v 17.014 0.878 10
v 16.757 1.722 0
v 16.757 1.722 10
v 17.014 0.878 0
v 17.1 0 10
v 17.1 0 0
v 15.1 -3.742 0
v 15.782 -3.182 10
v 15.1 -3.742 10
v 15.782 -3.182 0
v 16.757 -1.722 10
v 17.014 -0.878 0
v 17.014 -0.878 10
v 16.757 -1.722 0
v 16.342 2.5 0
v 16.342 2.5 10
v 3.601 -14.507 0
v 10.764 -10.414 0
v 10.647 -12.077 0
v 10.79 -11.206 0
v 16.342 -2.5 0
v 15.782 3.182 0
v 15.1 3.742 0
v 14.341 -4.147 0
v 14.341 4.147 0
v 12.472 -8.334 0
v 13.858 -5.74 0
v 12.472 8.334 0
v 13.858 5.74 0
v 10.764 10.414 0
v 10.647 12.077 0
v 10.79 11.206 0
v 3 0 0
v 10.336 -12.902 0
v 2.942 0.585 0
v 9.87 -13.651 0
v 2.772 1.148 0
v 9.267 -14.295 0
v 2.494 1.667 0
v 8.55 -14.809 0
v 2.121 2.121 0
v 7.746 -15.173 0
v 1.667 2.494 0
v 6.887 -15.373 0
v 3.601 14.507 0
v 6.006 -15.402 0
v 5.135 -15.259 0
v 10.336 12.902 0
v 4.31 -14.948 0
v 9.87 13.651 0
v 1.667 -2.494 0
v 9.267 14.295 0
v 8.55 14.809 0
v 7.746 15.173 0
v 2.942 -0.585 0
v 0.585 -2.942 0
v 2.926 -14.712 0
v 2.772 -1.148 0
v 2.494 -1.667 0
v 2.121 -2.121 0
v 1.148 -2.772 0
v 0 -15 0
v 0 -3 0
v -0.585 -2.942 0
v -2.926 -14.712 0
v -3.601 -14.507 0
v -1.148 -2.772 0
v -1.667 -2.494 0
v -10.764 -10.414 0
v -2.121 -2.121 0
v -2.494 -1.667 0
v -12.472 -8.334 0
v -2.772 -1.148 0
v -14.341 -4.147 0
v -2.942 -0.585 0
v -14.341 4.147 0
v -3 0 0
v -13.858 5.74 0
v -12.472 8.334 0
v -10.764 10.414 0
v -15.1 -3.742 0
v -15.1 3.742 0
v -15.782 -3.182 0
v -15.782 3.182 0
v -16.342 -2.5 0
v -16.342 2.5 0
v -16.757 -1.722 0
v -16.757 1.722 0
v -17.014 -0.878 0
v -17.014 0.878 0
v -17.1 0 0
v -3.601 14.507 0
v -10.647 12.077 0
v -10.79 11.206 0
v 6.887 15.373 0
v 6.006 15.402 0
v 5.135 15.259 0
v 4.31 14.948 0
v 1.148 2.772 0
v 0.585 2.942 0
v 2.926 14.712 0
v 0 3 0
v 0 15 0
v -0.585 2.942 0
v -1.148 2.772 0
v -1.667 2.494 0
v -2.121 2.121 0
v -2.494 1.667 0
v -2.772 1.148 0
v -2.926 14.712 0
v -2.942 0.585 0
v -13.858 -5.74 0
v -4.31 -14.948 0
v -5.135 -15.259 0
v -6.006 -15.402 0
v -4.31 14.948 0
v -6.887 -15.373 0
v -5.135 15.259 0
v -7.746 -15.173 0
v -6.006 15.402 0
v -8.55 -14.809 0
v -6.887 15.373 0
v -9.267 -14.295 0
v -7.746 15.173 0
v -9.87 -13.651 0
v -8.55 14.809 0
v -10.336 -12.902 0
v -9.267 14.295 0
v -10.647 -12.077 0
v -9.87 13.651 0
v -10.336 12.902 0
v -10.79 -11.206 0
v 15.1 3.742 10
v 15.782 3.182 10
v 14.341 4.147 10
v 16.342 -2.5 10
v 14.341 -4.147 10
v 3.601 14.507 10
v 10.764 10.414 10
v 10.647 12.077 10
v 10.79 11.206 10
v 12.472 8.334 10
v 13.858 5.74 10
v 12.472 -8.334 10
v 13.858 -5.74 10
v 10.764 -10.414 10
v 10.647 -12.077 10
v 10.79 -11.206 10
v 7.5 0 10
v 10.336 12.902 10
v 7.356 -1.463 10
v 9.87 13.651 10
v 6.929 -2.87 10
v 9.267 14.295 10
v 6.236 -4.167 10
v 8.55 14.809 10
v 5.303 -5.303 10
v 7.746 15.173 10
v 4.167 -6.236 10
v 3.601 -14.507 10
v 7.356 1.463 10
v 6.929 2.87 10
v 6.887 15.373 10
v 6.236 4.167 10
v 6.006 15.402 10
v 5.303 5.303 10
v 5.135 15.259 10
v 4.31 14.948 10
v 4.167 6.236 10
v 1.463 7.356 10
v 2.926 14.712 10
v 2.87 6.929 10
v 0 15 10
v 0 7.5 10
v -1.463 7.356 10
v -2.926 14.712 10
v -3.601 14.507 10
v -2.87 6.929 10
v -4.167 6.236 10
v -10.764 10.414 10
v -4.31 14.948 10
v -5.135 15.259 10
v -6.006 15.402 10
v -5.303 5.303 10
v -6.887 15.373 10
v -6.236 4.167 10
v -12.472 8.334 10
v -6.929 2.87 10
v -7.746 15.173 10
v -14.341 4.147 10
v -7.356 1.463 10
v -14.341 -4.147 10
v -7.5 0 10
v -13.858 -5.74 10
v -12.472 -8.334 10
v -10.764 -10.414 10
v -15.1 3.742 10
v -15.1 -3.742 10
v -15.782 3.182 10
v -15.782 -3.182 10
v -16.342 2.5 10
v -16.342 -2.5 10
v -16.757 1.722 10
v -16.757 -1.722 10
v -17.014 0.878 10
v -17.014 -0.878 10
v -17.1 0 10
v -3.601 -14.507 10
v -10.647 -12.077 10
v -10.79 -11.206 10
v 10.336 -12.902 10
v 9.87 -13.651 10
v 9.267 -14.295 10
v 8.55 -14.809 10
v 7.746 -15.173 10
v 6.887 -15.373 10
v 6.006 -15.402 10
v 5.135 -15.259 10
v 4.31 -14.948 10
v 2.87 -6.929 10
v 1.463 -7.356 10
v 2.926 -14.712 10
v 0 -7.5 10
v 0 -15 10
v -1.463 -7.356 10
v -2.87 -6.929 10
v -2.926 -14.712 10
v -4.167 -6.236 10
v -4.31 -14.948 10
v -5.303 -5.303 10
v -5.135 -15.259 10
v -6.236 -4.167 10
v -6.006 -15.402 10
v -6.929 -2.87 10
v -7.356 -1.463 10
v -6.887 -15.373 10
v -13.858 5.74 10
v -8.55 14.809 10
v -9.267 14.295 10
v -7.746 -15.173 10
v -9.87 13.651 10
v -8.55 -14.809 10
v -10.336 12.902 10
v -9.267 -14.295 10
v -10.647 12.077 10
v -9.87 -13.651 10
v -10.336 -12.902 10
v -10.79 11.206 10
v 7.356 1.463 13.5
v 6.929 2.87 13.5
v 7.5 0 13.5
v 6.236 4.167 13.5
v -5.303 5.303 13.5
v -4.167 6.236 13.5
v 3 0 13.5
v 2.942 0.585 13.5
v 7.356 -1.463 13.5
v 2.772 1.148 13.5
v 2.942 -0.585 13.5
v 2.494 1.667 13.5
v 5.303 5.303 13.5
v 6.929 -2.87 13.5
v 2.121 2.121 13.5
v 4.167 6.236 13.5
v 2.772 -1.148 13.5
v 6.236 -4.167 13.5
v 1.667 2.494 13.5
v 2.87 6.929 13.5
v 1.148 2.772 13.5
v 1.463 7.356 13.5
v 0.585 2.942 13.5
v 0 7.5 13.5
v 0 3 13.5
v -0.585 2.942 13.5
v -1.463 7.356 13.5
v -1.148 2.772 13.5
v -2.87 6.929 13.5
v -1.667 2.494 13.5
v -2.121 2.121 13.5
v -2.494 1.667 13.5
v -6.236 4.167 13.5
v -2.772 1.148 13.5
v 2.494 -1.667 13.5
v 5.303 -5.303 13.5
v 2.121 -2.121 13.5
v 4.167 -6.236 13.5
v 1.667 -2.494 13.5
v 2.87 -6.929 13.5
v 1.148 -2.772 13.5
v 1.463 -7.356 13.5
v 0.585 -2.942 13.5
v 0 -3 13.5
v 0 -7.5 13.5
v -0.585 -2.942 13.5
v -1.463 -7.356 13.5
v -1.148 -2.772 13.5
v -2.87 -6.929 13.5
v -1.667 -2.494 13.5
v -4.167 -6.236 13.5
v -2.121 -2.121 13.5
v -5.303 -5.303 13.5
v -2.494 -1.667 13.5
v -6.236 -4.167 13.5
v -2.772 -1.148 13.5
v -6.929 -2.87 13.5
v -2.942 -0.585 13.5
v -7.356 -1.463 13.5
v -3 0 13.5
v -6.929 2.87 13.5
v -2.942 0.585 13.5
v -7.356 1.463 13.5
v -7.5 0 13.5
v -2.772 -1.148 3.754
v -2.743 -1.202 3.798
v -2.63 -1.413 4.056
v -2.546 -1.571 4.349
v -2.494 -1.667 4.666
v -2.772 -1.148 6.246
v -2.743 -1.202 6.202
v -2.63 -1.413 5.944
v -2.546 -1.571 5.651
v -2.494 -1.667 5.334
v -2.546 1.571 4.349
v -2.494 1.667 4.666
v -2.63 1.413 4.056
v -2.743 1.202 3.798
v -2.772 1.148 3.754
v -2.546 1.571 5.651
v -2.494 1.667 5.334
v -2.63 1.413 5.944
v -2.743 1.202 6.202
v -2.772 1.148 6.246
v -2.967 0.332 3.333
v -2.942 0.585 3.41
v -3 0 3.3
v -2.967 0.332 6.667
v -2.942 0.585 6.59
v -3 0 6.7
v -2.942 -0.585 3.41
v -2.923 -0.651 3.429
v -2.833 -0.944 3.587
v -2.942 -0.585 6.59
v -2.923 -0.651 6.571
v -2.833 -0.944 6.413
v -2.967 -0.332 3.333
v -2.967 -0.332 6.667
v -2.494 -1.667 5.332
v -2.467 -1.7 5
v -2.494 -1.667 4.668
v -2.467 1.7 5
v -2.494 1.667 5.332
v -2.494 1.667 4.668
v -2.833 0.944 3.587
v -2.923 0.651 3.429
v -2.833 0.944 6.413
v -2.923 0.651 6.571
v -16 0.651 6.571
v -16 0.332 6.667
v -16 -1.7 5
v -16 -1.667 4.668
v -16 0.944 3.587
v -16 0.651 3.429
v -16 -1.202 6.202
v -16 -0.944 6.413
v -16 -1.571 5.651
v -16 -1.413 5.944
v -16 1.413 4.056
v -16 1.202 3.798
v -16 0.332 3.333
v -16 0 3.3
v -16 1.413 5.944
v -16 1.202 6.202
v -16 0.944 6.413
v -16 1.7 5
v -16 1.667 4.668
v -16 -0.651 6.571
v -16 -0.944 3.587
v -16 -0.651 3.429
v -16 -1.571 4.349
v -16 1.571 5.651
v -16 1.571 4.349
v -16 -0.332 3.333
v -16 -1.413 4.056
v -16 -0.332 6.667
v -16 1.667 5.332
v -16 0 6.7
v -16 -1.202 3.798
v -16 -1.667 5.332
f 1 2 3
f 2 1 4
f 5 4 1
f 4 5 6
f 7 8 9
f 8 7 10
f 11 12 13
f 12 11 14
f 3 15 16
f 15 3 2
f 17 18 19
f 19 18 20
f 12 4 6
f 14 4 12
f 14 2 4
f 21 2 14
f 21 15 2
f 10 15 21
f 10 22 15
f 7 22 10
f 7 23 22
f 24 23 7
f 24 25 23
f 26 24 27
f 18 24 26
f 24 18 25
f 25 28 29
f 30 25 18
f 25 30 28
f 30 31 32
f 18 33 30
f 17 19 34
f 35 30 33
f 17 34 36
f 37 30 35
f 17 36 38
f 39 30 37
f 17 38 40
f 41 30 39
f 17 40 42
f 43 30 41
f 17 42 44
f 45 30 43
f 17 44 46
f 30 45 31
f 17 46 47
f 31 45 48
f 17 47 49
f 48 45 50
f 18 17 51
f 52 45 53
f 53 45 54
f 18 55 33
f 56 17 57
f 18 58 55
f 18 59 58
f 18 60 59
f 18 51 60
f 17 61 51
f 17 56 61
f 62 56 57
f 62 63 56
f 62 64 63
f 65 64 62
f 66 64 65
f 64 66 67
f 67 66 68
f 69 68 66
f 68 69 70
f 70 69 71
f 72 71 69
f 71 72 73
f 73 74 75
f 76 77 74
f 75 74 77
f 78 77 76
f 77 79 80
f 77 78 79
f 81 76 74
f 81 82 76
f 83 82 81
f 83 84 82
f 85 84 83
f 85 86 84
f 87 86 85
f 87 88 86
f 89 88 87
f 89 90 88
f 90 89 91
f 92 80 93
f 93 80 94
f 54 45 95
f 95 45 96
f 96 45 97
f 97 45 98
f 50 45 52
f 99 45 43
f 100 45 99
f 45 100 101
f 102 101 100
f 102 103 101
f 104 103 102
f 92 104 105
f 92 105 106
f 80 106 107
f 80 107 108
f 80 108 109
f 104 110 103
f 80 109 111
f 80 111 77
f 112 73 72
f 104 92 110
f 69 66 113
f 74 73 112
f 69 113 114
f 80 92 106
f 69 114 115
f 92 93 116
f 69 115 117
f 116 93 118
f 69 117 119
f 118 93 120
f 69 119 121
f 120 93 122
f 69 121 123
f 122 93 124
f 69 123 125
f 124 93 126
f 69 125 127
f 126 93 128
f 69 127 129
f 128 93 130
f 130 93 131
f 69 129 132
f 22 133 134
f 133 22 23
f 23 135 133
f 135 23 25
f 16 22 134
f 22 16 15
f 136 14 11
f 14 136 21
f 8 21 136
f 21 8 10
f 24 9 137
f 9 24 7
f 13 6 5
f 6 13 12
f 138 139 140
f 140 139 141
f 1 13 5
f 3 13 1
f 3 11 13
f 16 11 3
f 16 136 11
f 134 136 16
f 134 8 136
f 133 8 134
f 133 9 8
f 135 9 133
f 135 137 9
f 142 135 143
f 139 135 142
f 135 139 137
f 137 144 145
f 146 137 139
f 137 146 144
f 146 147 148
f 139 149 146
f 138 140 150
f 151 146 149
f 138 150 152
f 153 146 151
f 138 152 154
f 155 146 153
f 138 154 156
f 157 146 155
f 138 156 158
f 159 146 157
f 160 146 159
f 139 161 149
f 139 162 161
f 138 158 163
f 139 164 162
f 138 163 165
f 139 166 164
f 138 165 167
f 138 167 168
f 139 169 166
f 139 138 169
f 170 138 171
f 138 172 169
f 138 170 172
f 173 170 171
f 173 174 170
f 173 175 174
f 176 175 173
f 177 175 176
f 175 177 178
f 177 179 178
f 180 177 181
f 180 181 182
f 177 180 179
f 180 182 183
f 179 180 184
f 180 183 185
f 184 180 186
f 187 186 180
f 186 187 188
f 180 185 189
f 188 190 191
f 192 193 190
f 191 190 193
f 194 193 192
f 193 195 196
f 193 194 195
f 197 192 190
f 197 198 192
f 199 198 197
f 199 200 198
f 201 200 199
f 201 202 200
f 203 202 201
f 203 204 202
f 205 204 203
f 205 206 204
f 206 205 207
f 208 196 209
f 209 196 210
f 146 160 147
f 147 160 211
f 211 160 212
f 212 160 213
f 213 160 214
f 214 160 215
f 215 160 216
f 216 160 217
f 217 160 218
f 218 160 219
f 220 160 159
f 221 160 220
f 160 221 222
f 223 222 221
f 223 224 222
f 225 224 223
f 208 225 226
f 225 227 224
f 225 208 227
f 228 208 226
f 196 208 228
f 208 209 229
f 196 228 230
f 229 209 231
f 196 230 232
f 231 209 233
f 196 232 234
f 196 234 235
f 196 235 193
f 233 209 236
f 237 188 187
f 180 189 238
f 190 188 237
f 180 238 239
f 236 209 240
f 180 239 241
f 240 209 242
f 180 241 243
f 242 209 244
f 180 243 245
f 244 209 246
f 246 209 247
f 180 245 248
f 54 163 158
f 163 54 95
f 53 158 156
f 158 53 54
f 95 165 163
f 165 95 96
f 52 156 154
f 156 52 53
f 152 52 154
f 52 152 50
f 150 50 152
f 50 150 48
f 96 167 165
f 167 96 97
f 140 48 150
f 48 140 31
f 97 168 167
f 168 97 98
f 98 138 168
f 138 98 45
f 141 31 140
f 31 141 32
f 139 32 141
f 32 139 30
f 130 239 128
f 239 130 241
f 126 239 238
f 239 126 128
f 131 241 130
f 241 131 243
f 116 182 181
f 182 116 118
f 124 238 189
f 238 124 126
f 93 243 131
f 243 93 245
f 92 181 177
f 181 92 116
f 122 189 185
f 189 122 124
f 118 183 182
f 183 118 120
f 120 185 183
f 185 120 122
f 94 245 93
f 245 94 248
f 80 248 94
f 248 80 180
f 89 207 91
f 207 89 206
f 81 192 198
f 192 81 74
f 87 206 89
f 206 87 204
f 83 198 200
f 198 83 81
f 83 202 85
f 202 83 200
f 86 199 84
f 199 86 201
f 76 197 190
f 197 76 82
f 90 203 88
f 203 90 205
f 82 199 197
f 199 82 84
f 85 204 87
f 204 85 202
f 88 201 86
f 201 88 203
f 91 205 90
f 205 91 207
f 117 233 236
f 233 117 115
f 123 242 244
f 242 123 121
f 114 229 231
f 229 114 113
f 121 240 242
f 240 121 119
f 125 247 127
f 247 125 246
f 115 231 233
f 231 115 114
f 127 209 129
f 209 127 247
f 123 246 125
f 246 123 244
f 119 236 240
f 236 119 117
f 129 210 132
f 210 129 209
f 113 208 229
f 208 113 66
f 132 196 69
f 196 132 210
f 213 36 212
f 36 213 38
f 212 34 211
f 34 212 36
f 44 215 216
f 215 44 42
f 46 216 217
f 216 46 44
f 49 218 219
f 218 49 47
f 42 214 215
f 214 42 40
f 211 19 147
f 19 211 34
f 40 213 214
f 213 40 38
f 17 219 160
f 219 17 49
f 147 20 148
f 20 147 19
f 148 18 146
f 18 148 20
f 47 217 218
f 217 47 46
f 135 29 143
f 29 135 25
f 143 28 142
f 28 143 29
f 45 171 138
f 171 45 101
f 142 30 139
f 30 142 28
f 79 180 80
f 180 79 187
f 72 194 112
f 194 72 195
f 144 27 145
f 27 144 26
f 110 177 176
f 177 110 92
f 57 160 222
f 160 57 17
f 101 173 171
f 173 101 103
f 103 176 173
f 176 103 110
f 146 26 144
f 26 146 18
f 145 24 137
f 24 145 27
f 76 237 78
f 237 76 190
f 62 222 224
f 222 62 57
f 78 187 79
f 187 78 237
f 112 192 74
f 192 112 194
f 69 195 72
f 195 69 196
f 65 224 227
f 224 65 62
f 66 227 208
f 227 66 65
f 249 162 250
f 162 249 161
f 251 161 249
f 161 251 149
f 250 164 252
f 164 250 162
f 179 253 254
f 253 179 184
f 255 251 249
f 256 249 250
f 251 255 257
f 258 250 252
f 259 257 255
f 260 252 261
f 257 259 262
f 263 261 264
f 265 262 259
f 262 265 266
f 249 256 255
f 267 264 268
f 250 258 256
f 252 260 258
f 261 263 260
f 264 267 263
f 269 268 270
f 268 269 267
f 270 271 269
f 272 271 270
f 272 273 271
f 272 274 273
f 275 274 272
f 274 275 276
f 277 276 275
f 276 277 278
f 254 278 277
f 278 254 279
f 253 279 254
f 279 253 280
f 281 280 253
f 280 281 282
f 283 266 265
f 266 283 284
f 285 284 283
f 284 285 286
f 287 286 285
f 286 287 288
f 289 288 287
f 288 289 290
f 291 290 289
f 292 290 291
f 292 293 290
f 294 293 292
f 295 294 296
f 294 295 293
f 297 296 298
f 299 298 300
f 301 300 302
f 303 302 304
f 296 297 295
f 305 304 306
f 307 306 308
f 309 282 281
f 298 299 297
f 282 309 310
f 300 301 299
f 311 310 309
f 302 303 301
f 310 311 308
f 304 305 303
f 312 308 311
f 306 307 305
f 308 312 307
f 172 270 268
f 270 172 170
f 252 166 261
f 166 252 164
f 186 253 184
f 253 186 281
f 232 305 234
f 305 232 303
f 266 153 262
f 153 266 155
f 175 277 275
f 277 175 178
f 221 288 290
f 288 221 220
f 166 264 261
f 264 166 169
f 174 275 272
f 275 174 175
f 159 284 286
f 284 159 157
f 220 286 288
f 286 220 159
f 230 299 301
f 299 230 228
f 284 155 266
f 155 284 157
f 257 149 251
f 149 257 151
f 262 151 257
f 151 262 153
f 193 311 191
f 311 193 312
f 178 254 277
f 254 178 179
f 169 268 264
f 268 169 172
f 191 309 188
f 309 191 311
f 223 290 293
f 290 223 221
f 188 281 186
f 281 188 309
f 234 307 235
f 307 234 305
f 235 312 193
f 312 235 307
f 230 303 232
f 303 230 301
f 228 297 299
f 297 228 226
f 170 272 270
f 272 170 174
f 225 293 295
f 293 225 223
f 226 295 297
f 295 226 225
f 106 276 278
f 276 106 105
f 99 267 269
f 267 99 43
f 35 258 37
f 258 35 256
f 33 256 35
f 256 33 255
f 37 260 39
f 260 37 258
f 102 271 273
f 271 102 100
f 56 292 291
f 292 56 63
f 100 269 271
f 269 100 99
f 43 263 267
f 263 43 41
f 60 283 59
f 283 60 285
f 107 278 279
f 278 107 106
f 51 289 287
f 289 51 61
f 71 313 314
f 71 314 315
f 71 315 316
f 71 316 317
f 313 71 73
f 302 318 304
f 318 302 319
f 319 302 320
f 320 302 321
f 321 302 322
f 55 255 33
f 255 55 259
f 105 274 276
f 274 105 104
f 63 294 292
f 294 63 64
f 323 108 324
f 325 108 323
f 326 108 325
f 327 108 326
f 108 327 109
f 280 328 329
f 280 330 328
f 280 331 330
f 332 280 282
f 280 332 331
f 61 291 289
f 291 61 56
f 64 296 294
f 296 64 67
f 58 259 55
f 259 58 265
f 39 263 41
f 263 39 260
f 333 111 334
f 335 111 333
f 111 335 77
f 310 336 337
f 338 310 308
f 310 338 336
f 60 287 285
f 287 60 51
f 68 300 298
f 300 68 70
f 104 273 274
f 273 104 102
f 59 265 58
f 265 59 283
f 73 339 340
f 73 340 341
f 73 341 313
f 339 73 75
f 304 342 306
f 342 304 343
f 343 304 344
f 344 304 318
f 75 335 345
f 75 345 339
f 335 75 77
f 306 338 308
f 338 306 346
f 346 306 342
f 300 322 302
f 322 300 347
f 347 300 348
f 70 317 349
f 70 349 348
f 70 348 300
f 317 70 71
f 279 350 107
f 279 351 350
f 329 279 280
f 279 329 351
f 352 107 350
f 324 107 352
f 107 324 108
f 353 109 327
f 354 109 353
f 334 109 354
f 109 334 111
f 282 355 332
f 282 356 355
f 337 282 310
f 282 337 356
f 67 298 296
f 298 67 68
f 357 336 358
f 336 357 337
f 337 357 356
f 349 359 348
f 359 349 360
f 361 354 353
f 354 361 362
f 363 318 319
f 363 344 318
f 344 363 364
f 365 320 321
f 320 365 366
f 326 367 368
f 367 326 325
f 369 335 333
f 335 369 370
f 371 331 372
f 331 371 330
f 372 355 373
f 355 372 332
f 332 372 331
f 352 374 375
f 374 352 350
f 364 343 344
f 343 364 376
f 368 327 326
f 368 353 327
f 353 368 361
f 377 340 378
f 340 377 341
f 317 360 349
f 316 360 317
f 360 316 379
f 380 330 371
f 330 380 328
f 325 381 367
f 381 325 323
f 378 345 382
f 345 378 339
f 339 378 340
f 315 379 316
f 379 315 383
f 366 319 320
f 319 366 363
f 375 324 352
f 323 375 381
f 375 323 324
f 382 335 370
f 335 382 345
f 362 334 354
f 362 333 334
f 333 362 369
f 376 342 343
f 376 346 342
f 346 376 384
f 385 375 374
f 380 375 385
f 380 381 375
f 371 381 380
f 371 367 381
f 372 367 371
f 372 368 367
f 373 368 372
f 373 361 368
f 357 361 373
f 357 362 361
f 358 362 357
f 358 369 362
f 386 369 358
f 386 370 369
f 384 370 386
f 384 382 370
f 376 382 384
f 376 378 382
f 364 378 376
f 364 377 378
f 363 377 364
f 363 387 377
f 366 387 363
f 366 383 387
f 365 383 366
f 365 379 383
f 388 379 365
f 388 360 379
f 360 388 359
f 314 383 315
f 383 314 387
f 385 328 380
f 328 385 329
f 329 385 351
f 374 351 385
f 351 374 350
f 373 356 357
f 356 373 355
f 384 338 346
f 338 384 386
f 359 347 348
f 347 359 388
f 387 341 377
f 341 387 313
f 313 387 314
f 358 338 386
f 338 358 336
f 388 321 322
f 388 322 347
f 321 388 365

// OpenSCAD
$fn = 32;

// ----------------------------------------------------------------------
// Hand knob: 30 x 30 x 13.5 mm
// ----------------------------------------------------------------------

// --- parameters (mm) ---
grip_d = 30;              // knob diameter
grip_h = 10;              // knob height
shaft_d = 6;              // shaft bore
set_d = 3.4;              // set screw tap hole
knurl_dia = 0.7;          // knurl groove diameter
lobes = 6;                // grip lobes
cap_h = 3.5;              // raised centre cap
cap_d = 15;               // centre cap diameter

module body() {
  cylinder(h = grip_h, d = grip_d);
  for (i = [0 : lobes - 1])
    rotate([0, 0, i * 360 / lobes])
      translate([grip_d * 0.42, 0, 0])
        cylinder(h = grip_h, d = grip_d * 0.3);
}

module cap() {
  translate([0, 0, grip_h - 1]) cylinder(h = cap_h + 1, d = cap_d);
}

difference() {
  union() {
    body();
    cap();
  }
  translate([0, 0, -1]) cylinder(h = grip_h + cap_h + 2, d = shaft_d);
  translate([-grip_d / 2 - 1, 0, grip_h * 0.5]) rotate([0, 90, 0]) cylinder(h = grip_d / 2 + 2, d = set_d);
}
